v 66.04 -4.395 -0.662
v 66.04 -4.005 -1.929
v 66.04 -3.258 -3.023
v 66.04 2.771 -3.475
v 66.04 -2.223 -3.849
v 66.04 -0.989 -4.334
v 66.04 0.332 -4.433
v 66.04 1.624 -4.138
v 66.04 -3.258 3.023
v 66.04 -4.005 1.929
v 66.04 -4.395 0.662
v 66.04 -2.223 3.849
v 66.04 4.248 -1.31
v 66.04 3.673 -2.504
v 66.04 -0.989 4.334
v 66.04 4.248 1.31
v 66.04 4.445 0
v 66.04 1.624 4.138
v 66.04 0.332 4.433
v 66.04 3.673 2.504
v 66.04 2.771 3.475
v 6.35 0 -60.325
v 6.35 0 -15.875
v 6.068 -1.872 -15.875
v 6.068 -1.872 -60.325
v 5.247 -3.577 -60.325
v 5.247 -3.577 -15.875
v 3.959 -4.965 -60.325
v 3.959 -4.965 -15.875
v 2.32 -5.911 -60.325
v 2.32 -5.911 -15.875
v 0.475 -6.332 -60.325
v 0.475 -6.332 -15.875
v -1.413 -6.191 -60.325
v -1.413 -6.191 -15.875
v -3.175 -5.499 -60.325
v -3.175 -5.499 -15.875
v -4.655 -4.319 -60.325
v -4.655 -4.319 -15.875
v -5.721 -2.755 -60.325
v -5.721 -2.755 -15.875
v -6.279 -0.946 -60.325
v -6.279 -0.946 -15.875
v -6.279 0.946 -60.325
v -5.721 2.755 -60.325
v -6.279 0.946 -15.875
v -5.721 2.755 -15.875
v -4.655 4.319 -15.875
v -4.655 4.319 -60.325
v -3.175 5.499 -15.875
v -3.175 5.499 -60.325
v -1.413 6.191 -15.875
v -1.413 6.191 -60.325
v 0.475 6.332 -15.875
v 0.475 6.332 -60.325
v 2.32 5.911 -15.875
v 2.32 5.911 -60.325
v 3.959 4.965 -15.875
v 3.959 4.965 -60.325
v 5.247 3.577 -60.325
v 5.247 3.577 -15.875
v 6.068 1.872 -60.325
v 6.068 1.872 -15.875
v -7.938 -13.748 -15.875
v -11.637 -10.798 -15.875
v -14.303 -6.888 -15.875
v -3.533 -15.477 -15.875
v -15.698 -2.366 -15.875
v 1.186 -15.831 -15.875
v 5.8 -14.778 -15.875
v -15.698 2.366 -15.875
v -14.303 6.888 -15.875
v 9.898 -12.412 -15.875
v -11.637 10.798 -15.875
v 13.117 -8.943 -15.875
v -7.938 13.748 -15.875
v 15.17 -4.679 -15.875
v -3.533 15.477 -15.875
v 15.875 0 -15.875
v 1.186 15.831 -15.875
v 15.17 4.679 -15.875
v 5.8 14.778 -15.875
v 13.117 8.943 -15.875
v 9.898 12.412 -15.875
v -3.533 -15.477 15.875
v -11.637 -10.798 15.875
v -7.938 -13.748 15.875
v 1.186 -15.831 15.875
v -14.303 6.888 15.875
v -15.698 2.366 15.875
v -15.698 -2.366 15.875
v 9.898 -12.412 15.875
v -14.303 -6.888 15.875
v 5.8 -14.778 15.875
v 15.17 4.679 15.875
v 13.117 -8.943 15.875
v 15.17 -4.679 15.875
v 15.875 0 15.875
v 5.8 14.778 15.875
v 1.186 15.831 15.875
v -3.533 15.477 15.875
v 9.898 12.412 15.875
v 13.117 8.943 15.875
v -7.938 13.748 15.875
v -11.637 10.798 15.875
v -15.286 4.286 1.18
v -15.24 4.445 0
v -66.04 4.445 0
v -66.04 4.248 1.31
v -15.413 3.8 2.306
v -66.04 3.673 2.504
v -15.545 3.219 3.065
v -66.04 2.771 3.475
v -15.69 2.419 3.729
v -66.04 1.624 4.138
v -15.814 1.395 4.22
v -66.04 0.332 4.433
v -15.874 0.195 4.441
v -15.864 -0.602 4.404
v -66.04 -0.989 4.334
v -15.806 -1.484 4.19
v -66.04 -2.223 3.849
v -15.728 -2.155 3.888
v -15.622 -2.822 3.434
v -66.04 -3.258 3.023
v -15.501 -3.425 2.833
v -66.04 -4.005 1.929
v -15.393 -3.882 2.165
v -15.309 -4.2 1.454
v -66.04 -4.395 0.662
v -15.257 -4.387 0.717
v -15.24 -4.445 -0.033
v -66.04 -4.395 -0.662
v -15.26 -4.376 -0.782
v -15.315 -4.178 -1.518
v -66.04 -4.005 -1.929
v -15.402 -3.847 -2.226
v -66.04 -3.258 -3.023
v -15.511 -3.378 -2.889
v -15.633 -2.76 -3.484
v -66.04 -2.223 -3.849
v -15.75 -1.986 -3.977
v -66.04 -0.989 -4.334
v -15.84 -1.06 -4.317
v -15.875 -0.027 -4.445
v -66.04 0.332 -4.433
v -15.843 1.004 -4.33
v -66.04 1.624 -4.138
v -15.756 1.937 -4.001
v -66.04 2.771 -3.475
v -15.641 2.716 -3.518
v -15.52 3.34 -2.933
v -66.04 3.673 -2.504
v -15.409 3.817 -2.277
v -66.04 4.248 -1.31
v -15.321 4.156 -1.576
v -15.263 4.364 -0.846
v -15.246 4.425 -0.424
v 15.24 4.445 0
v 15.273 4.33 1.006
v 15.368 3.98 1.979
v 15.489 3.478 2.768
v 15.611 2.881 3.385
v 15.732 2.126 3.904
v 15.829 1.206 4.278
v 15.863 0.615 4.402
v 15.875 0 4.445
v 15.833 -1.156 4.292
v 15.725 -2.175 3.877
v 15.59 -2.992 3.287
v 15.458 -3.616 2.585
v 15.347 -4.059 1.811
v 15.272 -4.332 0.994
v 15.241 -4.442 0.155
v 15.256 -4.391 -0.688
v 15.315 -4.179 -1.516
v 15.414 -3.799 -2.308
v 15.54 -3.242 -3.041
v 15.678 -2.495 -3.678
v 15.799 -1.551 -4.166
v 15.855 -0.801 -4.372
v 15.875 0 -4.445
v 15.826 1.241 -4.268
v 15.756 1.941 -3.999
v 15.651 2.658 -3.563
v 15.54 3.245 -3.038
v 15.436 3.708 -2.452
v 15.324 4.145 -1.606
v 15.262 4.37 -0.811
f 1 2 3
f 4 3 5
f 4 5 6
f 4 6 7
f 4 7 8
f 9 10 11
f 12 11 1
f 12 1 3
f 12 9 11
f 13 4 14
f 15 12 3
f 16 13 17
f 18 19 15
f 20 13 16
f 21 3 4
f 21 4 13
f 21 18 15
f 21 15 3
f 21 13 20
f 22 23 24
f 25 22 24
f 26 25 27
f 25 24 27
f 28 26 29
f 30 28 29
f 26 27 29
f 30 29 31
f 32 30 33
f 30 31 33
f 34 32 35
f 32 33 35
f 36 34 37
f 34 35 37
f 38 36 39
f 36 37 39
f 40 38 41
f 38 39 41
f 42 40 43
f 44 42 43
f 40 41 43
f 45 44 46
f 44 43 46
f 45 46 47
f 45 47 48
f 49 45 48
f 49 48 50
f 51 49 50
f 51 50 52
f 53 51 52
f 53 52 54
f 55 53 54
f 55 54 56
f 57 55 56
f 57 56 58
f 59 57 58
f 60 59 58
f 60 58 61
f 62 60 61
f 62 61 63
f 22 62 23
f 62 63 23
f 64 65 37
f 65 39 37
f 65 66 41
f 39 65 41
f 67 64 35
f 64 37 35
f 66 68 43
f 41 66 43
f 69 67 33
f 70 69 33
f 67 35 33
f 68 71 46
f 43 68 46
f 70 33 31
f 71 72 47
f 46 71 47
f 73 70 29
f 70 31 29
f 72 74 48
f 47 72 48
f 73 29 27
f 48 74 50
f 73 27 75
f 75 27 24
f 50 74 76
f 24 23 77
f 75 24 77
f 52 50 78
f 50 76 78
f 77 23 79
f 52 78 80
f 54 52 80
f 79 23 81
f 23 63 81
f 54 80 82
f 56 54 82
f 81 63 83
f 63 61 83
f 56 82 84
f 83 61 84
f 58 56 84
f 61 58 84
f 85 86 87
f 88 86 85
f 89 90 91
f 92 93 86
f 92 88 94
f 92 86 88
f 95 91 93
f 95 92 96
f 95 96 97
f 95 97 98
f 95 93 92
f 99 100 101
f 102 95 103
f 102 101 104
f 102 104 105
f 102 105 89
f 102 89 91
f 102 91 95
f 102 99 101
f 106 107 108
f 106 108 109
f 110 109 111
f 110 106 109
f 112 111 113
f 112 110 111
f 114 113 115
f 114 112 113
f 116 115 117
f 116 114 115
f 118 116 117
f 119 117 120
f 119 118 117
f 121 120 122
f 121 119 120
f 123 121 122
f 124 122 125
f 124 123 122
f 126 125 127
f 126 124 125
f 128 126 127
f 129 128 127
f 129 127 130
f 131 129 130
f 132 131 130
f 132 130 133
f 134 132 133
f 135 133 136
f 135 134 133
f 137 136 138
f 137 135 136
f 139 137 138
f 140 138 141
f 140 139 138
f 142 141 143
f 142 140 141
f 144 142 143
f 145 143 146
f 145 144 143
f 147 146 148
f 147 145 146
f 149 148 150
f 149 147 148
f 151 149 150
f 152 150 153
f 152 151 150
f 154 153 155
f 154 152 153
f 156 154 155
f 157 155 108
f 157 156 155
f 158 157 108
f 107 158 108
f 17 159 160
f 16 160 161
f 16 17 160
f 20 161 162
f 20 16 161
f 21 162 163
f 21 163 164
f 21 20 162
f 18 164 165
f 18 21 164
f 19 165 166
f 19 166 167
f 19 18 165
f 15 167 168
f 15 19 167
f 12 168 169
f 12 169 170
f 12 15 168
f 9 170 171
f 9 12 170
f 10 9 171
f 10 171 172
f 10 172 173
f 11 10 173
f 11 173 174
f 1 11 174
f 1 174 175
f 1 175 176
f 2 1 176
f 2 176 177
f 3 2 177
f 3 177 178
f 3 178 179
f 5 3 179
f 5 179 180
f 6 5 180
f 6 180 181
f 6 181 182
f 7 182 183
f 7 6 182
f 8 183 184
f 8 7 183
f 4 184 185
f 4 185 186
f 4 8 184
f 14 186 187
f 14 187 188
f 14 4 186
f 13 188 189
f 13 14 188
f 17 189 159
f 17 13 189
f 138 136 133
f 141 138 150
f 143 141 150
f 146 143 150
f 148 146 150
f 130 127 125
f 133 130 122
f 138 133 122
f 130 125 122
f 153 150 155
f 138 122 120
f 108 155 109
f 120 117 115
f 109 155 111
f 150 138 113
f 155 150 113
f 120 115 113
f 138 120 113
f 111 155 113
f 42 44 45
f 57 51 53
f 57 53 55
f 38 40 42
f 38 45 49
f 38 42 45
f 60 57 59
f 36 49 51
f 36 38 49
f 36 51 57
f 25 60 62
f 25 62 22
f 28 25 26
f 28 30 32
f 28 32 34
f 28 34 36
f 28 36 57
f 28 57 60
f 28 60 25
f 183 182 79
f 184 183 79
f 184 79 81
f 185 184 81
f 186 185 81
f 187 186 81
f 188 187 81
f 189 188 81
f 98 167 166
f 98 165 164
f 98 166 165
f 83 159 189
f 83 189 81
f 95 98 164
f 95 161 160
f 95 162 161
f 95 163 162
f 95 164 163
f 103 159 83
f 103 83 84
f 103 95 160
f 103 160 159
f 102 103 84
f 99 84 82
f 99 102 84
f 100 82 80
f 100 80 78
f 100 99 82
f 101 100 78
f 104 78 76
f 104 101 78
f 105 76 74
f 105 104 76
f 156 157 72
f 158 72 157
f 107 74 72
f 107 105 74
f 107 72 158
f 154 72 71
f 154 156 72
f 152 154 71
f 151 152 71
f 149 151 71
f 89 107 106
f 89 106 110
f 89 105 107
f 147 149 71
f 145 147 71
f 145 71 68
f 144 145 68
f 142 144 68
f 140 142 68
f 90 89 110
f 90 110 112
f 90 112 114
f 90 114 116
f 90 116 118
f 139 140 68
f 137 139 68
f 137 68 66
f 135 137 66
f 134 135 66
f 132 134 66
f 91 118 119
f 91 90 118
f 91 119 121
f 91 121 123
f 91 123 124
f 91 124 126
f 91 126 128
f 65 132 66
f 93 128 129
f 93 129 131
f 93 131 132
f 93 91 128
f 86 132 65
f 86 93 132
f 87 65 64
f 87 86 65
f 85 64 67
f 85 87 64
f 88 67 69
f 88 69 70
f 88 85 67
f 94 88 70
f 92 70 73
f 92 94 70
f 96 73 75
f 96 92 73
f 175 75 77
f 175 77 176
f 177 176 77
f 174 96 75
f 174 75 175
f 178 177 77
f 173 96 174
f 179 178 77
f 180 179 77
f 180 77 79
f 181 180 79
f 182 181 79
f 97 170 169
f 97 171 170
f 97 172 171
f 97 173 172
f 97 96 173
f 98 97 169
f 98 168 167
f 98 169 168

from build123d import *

# Parameters (mm, degrees)
F0_R     = 15.875
F1_DEPTH = 15.875
F2_R     = 6.35
F3_DEPTH = 44.45
F4_R     = 4.445
F5_DEPTH = 66.04


with BuildPart() as f1:
    # F0 (on Top) → F1 (new body, symmetric)
    with BuildSketch(Plane.XY):
        Circle(F0_R)
    extrude(amount=F1_DEPTH, both=True)

    # F2 (on face) → F3 (join)
    with BuildSketch(Plane(origin=(0, 0, -15.875), x_dir=(1, 0, 0), z_dir=(0, 0, -1))):
        Circle(F2_R)
    extrude(amount=F3_DEPTH)

    # F4 (on Right) → F5 (join, symmetric)
    with BuildSketch(Plane.YZ):
        Circle(F4_R)
    extrude(amount=F5_DEPTH, both=True)


solid = f1.part
